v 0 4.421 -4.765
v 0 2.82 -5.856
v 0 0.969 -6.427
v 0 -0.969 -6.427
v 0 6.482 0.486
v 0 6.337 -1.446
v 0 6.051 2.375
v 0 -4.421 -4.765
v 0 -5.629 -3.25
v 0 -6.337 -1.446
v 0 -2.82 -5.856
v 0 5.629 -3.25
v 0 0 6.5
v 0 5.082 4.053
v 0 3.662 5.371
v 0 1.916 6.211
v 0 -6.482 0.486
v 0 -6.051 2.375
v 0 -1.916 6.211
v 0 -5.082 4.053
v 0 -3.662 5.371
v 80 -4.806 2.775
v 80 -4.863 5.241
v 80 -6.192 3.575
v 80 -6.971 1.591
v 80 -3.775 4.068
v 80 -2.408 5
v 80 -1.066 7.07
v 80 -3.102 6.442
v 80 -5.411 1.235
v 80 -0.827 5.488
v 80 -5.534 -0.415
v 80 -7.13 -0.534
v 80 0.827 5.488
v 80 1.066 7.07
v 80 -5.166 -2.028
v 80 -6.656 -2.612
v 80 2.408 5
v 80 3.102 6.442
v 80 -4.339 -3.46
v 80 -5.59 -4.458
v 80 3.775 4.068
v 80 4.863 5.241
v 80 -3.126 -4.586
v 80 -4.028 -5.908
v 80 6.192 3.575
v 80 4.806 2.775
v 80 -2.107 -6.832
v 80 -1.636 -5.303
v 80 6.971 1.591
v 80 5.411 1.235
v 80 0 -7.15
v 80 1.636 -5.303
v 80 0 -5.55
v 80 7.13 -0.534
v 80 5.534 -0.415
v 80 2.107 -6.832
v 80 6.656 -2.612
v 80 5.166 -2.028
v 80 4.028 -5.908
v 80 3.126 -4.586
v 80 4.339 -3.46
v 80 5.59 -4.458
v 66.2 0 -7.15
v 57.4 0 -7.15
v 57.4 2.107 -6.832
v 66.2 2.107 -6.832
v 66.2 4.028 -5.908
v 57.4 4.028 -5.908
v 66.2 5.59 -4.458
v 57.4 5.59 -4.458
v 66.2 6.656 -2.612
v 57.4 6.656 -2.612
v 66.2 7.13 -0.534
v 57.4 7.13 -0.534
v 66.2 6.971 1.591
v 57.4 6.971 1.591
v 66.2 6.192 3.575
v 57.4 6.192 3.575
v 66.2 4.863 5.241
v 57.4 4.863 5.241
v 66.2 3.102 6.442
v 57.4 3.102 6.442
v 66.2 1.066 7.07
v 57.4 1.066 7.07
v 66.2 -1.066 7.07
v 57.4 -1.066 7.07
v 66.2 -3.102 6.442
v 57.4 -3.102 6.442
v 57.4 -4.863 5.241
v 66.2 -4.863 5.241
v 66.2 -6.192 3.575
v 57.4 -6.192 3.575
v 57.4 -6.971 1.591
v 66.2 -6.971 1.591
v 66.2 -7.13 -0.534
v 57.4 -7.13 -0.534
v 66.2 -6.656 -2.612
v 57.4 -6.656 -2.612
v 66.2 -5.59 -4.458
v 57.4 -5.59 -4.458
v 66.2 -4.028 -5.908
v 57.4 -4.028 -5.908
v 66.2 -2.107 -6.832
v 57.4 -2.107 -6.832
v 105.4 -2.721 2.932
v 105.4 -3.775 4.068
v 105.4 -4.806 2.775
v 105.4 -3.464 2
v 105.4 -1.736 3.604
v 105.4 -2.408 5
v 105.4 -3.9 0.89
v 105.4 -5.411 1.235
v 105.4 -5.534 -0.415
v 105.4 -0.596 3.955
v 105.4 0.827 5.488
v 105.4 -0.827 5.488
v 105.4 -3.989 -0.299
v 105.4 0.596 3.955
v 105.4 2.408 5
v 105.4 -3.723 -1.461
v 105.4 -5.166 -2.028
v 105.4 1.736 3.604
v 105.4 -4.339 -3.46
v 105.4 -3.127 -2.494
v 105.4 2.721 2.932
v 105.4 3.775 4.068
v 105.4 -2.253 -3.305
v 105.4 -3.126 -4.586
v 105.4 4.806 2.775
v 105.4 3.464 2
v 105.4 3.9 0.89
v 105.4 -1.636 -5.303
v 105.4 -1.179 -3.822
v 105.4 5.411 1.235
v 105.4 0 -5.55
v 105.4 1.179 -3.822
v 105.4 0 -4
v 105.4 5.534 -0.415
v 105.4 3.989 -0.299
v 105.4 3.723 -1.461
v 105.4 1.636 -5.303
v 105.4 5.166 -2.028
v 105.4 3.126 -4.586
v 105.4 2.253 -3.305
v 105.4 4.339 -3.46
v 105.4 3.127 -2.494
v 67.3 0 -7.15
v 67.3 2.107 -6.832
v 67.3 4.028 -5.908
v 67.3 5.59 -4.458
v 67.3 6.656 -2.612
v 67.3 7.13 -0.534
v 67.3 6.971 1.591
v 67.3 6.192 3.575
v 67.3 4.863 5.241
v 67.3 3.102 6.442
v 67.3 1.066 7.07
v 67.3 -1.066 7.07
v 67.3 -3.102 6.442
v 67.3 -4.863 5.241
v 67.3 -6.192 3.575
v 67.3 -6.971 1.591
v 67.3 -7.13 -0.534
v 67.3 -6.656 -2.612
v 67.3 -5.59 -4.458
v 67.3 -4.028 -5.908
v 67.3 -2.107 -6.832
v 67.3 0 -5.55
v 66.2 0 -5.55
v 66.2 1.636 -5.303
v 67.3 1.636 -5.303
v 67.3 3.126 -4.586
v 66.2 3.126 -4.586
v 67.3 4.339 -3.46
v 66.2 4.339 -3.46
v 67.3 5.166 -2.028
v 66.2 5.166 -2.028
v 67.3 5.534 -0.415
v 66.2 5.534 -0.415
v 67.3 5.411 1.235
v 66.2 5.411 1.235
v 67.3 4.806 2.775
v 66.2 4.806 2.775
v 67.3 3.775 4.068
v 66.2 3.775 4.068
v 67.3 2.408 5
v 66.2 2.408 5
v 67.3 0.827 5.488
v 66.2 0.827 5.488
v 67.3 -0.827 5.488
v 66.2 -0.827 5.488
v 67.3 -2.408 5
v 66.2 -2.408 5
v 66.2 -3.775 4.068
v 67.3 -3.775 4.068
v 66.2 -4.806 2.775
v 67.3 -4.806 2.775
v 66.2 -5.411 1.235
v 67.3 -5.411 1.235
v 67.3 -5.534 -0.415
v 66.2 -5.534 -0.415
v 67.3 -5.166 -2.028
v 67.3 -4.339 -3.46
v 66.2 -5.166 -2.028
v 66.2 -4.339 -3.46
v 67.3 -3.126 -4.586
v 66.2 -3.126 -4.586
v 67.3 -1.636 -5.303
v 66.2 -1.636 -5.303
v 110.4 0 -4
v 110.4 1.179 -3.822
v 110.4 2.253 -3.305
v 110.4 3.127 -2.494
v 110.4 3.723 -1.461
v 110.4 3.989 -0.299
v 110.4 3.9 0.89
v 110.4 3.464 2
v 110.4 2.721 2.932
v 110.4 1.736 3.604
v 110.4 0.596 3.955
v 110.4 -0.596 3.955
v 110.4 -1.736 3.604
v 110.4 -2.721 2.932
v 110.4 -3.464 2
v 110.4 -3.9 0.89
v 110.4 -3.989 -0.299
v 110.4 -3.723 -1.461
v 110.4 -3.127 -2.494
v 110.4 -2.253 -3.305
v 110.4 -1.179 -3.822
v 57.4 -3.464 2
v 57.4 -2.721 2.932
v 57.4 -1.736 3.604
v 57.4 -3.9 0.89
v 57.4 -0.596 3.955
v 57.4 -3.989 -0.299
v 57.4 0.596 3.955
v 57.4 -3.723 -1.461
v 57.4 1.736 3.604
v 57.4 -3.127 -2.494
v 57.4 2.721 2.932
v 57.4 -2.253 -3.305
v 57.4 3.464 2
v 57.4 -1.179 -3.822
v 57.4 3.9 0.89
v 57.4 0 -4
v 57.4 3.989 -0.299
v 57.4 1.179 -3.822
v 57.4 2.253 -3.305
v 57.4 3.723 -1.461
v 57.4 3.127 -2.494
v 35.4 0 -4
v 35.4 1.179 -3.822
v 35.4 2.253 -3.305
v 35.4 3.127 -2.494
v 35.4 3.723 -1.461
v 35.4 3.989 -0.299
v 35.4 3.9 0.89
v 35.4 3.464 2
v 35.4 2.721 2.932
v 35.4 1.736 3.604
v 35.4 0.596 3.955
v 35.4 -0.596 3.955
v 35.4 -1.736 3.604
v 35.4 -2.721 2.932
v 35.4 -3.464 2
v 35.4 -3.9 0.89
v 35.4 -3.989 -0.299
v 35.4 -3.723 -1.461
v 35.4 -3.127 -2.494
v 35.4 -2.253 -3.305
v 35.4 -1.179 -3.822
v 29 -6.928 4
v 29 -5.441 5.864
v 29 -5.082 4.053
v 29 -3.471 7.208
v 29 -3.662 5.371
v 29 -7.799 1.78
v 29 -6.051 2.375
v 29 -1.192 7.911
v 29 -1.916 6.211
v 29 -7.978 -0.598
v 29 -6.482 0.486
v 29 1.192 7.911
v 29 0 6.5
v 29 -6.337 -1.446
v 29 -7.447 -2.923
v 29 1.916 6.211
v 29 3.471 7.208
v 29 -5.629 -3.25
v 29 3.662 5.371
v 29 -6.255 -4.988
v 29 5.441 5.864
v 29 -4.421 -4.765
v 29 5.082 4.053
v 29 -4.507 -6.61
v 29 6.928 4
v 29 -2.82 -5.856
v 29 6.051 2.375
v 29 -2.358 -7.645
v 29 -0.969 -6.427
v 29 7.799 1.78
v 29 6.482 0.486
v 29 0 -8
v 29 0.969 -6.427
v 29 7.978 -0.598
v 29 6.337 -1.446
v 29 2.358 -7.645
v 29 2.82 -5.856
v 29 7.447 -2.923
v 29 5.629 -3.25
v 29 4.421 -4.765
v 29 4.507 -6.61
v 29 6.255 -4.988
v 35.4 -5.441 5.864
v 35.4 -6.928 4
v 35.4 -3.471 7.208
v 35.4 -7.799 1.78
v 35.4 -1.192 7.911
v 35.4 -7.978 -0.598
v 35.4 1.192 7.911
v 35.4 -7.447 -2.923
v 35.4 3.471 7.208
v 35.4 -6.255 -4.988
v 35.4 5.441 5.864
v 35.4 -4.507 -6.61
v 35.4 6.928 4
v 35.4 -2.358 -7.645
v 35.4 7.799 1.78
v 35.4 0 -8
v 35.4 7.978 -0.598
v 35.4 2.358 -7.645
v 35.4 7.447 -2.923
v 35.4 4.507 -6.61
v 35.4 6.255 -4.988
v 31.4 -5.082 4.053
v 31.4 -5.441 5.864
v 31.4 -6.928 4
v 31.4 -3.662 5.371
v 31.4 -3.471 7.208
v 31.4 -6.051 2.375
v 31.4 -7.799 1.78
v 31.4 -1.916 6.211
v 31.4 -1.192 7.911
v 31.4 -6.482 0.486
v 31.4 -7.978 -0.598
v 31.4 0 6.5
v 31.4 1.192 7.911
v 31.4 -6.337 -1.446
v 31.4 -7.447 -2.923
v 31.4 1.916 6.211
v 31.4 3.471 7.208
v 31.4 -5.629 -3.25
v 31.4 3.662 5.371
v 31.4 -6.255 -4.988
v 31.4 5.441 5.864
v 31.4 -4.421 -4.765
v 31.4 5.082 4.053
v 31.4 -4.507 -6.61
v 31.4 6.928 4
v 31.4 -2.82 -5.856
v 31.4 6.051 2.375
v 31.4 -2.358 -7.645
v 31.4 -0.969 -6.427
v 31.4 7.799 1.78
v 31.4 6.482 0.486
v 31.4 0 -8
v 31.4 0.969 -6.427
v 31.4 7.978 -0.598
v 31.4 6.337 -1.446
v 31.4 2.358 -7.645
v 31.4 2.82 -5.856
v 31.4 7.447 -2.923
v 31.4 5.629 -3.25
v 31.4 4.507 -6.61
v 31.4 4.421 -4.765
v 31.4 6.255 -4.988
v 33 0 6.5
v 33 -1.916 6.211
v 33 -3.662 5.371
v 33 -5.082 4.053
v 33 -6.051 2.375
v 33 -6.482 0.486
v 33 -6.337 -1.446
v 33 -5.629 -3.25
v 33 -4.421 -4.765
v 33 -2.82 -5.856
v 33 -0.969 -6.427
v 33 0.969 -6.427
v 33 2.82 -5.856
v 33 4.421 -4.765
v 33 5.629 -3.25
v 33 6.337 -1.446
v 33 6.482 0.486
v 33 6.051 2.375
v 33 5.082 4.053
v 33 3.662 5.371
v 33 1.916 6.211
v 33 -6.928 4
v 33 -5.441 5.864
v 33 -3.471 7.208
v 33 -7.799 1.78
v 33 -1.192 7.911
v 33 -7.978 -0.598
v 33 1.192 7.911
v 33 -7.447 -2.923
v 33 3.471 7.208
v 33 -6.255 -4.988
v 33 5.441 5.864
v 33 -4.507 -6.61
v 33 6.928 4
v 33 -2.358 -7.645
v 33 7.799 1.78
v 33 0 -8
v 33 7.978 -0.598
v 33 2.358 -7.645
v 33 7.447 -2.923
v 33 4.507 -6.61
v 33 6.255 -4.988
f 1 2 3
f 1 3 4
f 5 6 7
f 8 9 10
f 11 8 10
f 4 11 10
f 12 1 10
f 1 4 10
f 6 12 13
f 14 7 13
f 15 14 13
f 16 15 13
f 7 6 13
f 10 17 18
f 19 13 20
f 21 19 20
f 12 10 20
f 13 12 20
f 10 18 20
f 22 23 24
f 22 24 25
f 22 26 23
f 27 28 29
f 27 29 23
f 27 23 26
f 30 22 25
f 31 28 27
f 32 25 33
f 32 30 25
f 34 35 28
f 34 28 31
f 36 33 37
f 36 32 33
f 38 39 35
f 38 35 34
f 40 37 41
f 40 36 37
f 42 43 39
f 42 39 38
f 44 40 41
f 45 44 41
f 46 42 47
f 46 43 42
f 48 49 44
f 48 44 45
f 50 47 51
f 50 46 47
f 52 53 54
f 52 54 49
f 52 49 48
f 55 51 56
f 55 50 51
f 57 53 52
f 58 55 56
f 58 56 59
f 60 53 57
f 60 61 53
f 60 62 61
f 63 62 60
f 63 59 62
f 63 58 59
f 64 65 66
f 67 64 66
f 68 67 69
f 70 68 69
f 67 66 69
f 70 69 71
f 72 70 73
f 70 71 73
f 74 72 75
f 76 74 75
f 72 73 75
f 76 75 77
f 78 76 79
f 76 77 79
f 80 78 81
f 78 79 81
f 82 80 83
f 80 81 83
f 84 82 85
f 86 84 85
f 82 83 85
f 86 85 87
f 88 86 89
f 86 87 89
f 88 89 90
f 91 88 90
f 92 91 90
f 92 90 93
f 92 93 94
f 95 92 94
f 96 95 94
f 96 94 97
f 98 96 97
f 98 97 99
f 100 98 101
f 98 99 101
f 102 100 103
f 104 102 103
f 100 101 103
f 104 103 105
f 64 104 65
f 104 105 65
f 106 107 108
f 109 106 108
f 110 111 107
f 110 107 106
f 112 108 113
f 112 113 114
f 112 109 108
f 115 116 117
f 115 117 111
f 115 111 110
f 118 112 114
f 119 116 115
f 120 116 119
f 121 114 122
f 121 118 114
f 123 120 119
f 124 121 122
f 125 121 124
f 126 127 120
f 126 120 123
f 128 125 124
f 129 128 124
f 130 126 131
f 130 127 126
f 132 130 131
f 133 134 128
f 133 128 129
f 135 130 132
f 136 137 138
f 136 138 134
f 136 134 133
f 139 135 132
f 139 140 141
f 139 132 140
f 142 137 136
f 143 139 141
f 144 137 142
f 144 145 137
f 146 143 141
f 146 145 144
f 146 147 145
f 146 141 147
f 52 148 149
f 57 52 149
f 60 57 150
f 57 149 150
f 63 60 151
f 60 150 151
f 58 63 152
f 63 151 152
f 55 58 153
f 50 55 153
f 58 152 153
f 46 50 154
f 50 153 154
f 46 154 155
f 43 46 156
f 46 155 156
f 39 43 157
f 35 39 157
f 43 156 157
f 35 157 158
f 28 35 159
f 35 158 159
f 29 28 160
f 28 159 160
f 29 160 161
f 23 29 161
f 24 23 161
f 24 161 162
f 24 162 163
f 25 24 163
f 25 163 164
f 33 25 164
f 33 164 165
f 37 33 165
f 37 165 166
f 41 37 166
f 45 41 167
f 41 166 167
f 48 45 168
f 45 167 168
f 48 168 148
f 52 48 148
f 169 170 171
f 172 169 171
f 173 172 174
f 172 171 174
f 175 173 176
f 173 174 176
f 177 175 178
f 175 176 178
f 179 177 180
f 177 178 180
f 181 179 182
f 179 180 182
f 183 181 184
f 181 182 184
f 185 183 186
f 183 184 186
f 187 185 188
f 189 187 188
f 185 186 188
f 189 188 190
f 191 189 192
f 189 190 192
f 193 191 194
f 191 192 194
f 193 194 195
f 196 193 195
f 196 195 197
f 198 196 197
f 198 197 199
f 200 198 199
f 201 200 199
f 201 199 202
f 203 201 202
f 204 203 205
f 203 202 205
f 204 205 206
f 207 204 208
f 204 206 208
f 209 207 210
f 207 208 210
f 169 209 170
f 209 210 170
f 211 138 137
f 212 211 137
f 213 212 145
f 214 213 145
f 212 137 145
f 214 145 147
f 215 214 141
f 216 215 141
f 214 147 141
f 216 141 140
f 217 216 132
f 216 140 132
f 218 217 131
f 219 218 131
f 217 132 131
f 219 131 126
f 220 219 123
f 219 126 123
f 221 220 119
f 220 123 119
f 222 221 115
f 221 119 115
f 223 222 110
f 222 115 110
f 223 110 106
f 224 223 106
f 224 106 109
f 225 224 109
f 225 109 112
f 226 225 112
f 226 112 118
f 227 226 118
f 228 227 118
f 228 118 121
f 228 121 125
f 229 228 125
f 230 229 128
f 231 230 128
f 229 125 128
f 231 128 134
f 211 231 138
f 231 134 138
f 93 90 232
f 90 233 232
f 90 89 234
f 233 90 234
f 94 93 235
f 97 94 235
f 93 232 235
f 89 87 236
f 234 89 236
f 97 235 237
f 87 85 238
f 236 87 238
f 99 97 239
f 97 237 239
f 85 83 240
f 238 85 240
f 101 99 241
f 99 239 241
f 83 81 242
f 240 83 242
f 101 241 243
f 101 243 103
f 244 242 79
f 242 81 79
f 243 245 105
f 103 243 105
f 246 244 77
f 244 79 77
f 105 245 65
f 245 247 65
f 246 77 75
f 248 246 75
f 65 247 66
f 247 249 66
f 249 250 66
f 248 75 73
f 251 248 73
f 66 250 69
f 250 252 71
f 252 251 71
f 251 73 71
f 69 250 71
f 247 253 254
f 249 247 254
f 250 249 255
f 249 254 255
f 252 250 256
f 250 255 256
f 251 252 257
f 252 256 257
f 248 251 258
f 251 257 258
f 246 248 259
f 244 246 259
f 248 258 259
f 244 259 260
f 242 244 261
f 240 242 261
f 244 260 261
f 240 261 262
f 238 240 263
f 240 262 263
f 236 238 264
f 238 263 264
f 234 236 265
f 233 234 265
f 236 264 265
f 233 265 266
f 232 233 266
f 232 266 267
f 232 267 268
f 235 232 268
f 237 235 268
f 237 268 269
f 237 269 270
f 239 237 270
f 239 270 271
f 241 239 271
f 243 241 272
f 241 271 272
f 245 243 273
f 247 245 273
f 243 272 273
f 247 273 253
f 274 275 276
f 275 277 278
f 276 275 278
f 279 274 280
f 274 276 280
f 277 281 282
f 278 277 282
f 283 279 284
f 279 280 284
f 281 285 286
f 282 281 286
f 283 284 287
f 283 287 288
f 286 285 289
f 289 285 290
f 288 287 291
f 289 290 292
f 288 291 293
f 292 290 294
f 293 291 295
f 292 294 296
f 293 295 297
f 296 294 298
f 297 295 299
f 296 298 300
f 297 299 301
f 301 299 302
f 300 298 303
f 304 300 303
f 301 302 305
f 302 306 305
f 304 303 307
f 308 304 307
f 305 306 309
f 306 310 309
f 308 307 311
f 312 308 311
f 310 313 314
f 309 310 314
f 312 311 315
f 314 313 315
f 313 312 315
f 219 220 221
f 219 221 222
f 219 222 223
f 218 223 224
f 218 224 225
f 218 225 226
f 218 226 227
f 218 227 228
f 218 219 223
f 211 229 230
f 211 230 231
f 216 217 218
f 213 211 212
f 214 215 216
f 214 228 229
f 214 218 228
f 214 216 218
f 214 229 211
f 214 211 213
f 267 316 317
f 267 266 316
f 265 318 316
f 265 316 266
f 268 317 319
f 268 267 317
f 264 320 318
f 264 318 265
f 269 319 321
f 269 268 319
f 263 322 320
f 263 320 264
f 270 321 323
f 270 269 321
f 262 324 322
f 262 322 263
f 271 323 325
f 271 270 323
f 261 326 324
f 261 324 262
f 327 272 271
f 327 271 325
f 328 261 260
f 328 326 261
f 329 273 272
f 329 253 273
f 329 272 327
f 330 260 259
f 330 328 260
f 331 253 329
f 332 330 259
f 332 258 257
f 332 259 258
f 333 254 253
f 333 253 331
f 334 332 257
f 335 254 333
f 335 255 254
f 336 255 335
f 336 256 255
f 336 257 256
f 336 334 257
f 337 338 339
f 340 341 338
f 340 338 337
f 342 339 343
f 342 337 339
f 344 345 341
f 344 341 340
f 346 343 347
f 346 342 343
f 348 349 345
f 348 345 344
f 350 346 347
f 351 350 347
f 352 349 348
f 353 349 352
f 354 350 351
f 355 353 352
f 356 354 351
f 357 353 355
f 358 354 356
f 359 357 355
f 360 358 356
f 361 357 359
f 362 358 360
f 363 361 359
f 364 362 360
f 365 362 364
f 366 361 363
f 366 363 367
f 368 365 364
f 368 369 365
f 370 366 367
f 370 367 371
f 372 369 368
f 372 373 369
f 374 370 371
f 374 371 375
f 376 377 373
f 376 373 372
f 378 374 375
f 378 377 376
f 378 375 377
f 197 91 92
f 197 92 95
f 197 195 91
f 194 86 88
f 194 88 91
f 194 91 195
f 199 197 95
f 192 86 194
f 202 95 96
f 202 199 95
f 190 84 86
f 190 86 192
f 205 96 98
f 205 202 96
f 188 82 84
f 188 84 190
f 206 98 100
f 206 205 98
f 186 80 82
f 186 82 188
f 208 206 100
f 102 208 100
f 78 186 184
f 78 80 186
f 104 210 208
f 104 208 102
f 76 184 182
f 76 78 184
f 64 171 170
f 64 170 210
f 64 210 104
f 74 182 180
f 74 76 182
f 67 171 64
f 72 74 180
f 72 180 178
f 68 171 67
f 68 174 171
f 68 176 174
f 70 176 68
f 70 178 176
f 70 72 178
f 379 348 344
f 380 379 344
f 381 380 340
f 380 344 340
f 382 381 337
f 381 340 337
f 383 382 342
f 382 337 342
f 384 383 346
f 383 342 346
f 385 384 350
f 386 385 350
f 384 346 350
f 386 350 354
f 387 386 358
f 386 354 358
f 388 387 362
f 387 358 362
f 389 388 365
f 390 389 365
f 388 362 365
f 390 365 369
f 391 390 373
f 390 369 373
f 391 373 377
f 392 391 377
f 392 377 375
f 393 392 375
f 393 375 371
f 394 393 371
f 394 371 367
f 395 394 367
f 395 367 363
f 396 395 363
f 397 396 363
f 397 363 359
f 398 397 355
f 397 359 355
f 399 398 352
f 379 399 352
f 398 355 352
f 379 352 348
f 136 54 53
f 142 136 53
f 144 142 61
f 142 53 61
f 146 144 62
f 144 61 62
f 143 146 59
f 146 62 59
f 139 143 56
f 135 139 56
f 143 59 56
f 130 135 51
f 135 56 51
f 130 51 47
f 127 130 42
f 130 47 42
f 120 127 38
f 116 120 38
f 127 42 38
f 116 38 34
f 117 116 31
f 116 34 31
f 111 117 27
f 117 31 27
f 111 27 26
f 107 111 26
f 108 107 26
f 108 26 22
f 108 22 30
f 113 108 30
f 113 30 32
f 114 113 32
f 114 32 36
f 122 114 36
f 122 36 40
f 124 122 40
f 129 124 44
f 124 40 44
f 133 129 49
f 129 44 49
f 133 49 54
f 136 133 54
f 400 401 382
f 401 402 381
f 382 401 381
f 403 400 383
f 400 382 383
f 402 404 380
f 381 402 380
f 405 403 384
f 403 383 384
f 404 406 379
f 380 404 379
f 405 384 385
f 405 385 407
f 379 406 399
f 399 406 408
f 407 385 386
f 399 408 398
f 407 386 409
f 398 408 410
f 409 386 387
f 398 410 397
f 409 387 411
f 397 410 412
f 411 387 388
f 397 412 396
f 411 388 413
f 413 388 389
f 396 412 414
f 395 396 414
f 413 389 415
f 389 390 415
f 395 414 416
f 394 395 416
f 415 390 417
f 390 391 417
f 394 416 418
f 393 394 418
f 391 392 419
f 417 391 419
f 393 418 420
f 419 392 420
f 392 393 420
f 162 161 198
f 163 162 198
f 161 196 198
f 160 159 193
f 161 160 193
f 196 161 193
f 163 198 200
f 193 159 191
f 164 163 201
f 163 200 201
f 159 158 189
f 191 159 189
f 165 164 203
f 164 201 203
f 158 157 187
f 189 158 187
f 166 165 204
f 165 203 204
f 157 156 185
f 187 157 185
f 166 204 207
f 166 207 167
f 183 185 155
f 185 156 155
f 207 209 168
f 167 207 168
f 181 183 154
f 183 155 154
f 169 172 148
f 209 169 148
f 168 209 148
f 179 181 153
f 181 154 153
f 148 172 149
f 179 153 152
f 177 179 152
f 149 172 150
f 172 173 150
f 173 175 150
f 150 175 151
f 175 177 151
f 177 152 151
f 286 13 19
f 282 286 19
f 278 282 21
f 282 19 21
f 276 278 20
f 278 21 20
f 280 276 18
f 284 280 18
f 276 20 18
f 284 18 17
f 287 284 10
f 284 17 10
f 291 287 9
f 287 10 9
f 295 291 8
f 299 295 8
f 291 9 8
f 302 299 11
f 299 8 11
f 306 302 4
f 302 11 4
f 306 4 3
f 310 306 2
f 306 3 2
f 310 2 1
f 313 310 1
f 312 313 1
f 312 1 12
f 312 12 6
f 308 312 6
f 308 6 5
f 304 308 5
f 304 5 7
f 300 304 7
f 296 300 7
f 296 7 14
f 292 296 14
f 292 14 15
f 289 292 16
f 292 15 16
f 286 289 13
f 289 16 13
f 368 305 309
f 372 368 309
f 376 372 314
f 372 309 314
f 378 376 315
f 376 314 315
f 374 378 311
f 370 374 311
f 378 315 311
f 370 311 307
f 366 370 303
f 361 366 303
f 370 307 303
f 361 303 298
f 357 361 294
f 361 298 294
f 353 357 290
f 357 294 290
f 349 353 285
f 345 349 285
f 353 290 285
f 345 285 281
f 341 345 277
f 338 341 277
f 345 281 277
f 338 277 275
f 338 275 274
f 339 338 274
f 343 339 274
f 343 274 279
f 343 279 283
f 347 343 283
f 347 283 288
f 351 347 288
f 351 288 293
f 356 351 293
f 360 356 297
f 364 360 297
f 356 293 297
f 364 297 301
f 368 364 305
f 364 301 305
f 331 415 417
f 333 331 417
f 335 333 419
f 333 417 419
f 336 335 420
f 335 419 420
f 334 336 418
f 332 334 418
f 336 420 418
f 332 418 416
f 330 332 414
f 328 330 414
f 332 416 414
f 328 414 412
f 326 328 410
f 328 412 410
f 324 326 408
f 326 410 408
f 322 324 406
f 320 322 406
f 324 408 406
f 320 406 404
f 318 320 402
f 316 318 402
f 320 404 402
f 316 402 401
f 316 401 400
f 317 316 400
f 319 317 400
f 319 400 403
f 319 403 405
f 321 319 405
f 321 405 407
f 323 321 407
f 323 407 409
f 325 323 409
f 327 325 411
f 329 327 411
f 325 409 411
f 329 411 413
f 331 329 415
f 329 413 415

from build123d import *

# Parameters (mm, degrees)
SKETCH_1_R       = 6.5
EXTRUDE_1_DEPTH  = 29
SKETCH_2_R       = 8
EXTRUDE_2_DEPTH  = 2.4
SKETCH_3_R       = 6.5
EXTRUDE_3_DEPTH  = 1.6
SKETCH_4_R       = 8
EXTRUDE_4_DEPTH  = 2.4
SKETCH_5_R       = 4
EXTRUDE_5_DEPTH  = 22
SKETCH_6_R       = 7.15
EXTRUDE_6_DEPTH  = 8.8
SKETCH_7_R       = 5.55
EXTRUDE_7_DEPTH  = 1.1
SKETCH_8_R       = 7.15
EXTRUDE_8_DEPTH  = 12.7
SKETCH_9_R       = 5.55
EXTRUDE_9_DEPTH  = 25.4
SKETCH_10_R      = 4
EXTRUDE_10_DEPTH = 5


with BuildPart() as part:
    # Эскиз1 → Бобышка-Вытянуть1 (new body)
    with BuildSketch(Plane(origin=(0, 0, 0), x_dir=(0, 0, -1), z_dir=(1, 0, 0))):
        with Locations(Location((0, 0, 0), (0, 0, 180))):
            Circle(SKETCH_1_R)
    extrude(amount=EXTRUDE_1_DEPTH)

    # Эскиз2 → Бобышка-Вытянуть2 (add)
    with BuildSketch(Plane(origin=(29, 0, 0), x_dir=(0, 0, -1), z_dir=(1, 0, 0))):
        Circle(SKETCH_2_R)
    extrude(amount=EXTRUDE_2_DEPTH)

    # Эскиз3 → Бобышка-Вытянуть3 (add)
    with BuildSketch(Plane(origin=(31.4, 0, 0), x_dir=(0, 0, -1), z_dir=(1, 0, 0))):
        with Locations(Location((0, 0, 0), (0, 0, 180))):
            Circle(SKETCH_3_R)
    extrude(amount=EXTRUDE_3_DEPTH)

    # Эскиз4 → Бобышка-Вытянуть4 (add)
    with BuildSketch(Plane(origin=(33, 0, 0), x_dir=(0, 0, -1), z_dir=(1, 0, 0))):
        Circle(SKETCH_4_R)
    extrude(amount=EXTRUDE_4_DEPTH)

    # Эскиз5 → Бобышка-Вытянуть5 (add)
    with BuildSketch(Plane(origin=(35.4, 0, 0), x_dir=(0, 0, -1), z_dir=(1, 0, 0))):
        Circle(SKETCH_5_R)
    extrude(amount=EXTRUDE_5_DEPTH)

    # Эскиз6 → Бобышка-Вытянуть6 (add)
    with BuildSketch(Plane(origin=(57.4, 0, 0), x_dir=(0, 0, -1), z_dir=(1, 0, 0))):
        Circle(SKETCH_6_R)
    extrude(amount=EXTRUDE_6_DEPTH)

    # Эскиз7 → Бобышка-Вытянуть7 (add)
    with BuildSketch(Plane(origin=(66.2, 0, 0), x_dir=(0, 0, -1), z_dir=(1, 0, 0))):
        Circle(SKETCH_7_R)
    extrude(amount=EXTRUDE_7_DEPTH)

    # Эскиз8 → Бобышка-Вытянуть8 (add)
    with BuildSketch(Plane(origin=(67.3, 0, 0), x_dir=(0, 0, -1), z_dir=(1, 0, 0))):
        Circle(SKETCH_8_R)
    extrude(amount=EXTRUDE_8_DEPTH)

    # Эскиз9 → Бобышка-Вытянуть9 (add)
    with BuildSketch(Plane(origin=(80, 0, 0), x_dir=(0, 0, -1), z_dir=(1, 0, 0))):
        Circle(SKETCH_9_R)
    extrude(amount=EXTRUDE_9_DEPTH)

    # Эскиз10 → Бобышка-Вытянуть10 (add)
    with BuildSketch(Plane(origin=(105.4, 0, 0), x_dir=(0, 0, -1), z_dir=(1, 0, 0))):
        Circle(SKETCH_10_R)
    extrude(amount=EXTRUDE_10_DEPTH)


solid = part.part
